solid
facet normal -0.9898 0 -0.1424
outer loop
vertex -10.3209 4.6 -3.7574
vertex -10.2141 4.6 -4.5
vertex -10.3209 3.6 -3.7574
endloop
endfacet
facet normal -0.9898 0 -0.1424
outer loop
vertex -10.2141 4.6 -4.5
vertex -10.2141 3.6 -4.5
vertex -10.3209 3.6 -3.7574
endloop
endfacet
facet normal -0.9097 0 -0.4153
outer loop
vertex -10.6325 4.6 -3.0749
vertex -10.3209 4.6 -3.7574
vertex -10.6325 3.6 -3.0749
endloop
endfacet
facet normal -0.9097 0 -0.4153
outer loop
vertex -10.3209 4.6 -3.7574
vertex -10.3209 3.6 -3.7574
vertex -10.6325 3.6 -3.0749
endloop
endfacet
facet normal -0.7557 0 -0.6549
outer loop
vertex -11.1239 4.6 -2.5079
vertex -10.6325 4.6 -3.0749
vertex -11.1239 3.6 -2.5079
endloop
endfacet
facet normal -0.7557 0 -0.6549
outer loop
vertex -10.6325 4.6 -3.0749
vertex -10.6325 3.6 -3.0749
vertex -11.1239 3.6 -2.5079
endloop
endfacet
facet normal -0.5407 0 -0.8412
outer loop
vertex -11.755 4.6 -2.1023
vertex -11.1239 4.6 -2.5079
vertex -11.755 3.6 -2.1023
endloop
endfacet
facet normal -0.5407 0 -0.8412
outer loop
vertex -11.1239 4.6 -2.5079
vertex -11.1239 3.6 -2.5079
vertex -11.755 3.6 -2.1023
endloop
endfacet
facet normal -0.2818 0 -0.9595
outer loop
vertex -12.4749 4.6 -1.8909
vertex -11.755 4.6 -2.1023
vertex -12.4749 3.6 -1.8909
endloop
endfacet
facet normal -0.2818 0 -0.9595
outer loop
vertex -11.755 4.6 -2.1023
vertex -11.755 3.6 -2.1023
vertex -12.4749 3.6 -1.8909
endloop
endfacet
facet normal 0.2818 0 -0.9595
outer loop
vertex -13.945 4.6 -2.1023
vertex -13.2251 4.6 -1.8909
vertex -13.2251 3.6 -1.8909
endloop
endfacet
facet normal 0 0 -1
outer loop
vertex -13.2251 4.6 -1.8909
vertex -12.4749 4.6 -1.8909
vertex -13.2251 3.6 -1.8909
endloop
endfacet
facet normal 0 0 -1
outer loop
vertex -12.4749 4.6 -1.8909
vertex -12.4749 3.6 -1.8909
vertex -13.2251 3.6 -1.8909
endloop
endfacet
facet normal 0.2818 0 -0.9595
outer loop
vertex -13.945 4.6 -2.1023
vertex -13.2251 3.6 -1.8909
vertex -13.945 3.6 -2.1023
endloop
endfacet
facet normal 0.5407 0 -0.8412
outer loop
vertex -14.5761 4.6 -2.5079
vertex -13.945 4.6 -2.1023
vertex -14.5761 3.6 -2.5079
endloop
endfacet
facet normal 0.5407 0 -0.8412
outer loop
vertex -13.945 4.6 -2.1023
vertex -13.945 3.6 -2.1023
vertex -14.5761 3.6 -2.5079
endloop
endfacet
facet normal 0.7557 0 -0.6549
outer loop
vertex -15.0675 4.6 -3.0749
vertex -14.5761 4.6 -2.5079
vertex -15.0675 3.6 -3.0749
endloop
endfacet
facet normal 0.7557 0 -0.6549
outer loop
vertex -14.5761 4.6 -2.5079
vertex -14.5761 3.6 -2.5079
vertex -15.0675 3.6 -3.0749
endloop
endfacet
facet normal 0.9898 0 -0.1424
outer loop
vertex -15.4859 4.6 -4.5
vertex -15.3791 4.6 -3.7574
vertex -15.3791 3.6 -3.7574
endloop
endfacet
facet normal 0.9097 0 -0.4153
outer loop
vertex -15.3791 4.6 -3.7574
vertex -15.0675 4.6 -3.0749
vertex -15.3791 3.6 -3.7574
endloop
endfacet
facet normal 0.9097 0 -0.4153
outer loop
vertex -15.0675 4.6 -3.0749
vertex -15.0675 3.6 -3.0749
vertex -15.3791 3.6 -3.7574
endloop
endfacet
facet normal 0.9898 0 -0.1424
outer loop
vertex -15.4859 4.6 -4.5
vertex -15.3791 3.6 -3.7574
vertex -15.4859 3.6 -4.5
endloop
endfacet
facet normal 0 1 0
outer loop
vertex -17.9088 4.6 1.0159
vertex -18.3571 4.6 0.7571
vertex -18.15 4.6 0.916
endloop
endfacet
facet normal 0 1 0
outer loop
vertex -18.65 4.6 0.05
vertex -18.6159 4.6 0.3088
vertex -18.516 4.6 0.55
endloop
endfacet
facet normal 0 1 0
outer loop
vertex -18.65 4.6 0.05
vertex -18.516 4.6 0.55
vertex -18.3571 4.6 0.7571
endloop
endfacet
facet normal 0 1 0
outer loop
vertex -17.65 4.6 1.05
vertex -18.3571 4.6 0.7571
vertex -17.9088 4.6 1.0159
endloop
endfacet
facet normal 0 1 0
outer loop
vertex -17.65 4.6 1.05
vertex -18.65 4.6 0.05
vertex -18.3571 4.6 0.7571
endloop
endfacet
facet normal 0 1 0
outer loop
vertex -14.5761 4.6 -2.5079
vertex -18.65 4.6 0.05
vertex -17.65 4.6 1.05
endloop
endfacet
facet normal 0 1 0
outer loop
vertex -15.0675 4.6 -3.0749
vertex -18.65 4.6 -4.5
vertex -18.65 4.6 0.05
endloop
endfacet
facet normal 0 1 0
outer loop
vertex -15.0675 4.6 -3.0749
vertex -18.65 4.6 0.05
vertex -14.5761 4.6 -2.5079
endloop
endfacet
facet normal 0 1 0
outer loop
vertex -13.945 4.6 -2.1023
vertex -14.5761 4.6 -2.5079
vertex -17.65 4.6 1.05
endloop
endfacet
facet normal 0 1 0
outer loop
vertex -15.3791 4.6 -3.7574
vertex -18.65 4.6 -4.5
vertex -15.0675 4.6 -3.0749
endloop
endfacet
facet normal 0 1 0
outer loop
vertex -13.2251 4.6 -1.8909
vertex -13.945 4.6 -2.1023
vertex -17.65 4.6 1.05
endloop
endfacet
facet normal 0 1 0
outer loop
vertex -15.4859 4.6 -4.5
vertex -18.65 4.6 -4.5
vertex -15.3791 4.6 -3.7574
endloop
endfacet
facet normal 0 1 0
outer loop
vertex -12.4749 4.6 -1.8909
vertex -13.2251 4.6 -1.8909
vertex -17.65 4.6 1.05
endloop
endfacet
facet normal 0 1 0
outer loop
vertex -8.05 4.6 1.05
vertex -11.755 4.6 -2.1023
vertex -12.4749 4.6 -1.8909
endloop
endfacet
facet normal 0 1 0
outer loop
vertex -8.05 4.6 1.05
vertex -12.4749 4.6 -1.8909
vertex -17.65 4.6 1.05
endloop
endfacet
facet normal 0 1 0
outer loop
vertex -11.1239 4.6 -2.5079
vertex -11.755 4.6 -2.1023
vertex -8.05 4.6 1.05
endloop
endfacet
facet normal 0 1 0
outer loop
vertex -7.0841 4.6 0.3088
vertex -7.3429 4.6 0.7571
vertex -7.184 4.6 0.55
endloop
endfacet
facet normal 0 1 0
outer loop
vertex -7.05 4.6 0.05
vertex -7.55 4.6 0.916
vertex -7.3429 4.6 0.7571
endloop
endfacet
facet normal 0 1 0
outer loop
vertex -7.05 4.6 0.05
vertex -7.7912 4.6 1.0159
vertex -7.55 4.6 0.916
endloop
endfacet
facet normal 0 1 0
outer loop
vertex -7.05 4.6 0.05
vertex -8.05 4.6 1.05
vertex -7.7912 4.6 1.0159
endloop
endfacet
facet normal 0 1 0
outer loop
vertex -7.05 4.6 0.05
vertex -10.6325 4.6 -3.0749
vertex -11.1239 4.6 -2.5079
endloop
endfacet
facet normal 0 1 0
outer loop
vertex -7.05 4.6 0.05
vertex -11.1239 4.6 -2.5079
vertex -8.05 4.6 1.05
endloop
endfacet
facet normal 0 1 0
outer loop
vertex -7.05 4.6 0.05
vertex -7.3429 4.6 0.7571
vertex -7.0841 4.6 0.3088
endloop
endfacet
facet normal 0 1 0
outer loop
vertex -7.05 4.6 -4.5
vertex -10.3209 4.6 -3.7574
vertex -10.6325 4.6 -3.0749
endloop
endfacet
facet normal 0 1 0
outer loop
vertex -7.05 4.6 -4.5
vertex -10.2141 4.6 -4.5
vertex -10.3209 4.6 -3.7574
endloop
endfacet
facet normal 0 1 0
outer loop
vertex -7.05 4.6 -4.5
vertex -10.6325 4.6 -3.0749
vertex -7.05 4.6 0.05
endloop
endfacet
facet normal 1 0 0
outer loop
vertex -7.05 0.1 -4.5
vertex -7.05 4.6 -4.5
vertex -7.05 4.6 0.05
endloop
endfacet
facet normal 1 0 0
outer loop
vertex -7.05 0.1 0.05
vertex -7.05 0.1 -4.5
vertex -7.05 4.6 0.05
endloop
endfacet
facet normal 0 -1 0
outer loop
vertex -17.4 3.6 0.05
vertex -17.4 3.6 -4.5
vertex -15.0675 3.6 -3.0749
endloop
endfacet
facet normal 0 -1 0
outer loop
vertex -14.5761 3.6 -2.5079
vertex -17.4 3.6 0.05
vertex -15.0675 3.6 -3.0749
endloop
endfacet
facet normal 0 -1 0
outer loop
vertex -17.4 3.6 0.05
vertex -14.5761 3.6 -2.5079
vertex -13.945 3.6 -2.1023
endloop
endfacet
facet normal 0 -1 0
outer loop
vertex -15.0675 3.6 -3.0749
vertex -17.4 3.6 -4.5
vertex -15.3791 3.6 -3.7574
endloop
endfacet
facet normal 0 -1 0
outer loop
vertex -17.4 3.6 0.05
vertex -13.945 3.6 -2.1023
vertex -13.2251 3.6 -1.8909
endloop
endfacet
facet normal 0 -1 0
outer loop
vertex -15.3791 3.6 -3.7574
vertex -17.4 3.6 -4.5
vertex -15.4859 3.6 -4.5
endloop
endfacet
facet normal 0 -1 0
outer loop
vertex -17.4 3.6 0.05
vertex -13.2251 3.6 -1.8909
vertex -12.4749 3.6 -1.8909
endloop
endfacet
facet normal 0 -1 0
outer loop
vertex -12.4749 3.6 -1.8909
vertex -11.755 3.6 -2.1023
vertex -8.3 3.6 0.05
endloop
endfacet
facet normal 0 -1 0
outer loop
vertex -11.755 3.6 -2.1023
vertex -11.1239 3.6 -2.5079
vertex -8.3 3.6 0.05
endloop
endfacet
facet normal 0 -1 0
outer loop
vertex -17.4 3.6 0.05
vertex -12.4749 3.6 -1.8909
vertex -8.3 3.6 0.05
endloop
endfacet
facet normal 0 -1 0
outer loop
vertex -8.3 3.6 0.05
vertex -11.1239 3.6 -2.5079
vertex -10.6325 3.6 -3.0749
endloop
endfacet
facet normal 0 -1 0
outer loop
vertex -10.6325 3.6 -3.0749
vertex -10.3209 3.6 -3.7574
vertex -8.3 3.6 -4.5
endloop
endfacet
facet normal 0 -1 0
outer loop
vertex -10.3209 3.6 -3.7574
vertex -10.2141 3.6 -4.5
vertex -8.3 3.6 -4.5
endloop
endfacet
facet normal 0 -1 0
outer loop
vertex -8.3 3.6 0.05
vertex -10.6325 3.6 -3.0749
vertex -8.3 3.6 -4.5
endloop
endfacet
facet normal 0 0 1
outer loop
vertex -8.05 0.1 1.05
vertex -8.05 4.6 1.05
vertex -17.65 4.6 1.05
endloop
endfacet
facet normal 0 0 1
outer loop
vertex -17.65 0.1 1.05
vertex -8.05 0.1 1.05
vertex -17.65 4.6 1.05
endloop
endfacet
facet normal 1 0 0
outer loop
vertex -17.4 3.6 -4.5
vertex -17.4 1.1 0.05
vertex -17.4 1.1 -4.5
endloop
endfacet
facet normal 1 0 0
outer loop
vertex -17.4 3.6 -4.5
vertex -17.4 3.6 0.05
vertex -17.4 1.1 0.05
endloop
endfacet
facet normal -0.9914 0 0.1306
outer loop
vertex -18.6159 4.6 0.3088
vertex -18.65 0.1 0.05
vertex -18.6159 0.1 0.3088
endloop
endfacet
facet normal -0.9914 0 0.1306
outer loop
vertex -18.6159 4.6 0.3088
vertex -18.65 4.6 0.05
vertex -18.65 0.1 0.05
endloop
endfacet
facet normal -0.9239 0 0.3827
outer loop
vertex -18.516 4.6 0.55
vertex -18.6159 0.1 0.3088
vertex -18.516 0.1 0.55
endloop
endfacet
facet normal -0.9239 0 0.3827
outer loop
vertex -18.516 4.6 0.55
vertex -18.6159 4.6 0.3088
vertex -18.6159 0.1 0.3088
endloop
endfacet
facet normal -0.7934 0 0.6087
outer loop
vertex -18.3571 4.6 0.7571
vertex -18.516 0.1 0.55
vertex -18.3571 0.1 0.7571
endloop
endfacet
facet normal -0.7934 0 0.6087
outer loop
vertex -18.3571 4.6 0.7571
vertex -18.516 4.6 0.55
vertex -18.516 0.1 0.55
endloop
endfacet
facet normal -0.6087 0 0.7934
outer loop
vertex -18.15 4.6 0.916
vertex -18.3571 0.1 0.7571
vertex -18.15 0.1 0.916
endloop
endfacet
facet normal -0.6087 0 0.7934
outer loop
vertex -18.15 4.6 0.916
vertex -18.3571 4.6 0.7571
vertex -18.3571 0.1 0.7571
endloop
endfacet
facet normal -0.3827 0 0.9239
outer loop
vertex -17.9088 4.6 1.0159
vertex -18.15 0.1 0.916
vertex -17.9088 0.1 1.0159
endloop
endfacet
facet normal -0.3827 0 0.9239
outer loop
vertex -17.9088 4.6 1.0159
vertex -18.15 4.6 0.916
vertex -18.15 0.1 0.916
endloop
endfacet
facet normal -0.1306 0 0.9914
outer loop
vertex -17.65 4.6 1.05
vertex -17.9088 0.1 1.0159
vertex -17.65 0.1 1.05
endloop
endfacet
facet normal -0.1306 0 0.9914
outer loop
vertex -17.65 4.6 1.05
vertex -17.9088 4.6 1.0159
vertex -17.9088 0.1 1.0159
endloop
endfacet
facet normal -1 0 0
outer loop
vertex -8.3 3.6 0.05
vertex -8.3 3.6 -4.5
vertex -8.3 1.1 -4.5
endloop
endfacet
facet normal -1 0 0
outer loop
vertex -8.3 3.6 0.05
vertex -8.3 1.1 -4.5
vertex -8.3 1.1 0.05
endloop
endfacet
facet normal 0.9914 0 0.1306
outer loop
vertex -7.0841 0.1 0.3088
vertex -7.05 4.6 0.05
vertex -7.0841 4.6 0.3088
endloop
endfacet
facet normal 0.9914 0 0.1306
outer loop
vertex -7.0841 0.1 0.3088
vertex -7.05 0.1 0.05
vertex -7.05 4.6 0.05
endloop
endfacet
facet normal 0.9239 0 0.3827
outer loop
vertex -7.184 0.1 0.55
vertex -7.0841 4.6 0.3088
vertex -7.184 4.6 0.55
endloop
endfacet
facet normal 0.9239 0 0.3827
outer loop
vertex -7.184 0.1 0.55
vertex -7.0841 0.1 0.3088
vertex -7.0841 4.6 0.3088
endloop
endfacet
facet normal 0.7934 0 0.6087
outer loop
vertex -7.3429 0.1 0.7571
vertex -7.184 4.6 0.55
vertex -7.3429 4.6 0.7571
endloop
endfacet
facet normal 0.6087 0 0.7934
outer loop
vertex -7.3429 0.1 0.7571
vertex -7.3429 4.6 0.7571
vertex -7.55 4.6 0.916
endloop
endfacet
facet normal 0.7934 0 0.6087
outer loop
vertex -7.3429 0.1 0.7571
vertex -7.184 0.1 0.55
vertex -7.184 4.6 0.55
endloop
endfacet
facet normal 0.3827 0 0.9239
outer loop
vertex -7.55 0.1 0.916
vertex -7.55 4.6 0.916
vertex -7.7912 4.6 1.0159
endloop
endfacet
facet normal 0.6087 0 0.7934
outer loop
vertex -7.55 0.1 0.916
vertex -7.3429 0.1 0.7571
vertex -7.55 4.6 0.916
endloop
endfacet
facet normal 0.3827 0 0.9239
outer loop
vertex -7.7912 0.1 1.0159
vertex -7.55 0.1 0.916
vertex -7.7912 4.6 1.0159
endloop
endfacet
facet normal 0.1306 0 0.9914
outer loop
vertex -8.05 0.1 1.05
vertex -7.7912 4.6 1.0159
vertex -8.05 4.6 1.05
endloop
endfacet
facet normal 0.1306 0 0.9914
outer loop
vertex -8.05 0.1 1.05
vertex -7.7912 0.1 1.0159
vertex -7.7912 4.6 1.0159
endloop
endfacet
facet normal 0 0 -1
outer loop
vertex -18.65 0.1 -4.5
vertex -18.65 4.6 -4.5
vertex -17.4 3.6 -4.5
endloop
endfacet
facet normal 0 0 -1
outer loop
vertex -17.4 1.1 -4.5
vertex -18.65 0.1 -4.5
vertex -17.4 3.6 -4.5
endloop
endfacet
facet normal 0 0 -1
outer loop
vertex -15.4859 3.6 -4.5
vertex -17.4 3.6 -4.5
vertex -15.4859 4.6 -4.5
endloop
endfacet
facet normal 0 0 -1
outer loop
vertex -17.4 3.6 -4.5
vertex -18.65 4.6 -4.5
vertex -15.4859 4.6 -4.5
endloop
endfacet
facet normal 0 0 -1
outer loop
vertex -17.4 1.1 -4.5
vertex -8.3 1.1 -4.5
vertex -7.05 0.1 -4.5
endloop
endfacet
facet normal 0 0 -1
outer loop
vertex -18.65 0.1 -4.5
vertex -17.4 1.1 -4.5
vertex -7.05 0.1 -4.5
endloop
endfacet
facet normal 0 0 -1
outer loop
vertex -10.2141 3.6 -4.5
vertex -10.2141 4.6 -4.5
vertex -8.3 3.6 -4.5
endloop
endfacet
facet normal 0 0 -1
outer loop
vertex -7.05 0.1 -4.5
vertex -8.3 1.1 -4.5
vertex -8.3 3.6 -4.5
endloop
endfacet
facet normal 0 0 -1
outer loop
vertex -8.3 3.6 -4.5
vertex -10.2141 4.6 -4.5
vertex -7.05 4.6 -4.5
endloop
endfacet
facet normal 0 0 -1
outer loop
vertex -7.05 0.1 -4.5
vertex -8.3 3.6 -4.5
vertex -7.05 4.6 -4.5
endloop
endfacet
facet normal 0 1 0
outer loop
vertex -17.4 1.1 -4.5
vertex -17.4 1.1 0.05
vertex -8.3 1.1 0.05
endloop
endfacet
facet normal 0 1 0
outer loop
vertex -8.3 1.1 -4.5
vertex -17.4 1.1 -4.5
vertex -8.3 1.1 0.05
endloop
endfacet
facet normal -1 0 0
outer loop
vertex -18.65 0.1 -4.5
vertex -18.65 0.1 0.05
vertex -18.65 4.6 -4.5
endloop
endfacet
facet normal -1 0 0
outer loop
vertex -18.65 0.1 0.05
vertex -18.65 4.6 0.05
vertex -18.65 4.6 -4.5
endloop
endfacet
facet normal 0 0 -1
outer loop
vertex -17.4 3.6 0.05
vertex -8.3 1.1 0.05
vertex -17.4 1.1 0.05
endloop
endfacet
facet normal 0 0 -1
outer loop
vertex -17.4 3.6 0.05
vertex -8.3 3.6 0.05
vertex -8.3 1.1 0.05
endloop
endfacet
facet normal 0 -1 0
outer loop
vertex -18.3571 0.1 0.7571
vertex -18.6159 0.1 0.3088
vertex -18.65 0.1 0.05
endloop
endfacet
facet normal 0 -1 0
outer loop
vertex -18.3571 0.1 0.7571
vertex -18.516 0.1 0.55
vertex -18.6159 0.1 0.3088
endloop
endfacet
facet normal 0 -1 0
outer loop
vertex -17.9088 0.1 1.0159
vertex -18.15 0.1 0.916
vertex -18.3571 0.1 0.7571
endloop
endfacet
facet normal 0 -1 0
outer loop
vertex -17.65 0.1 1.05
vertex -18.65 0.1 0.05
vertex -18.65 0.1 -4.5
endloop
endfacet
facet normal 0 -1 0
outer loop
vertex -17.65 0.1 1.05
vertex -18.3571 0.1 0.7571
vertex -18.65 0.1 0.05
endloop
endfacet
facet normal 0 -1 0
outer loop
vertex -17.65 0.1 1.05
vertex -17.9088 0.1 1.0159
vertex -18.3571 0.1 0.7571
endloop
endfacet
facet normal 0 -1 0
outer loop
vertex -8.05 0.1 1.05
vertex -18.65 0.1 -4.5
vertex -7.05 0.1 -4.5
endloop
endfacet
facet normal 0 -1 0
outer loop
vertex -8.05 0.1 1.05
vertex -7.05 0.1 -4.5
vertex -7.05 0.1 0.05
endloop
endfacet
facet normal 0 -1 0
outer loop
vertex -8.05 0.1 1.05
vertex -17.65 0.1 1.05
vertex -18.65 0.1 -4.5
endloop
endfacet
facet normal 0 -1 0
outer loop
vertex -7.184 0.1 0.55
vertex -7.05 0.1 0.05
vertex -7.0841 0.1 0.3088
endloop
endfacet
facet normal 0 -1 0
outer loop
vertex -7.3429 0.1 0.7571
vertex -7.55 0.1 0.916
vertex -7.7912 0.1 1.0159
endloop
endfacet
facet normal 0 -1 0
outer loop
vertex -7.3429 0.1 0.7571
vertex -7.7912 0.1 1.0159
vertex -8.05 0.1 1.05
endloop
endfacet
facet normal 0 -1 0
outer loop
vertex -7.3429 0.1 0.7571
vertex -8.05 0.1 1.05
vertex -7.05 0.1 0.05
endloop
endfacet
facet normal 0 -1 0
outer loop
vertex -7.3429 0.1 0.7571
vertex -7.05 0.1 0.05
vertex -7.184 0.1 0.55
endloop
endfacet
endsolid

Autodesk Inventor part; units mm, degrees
ref_plane "YZ Plane" through (0, 0, 0) normal (1, 0, 0) x (0, 1, 0)
ref_plane "XZ Plane" through (0, 0, 0) normal (0, 1, 0) x (-1, 0, 0)
ref_plane "XY Plane" through (0, 0, 0) normal (0, 0, 1) x (1, 0, 0)
ref_plane "Arbeitsebene1" through (-12.85, 3.6, -4.5) normal (0, -1, 0) x (0, 0, 1)
sketch "Skizze1" plane through (-12.85, 3.6, -4.5) normal (0, -1, 0) x (0, 0, 1)
  circle A0 centre (0, 0) radius 4.3 construction
  line L0 (0.4805, 5.7801) -> (0.4805, 4.5246)
  line L1 (0.4805, -4.5246) -> (0.4805, -5.7801)
  line L2 (0, -5.8) -> (5.55, -5.8)
  line L3 (5.55, -5.8) -> (5.55, 5.8)
  line L4 (5.55, 5.8) -> (0, 5.8)
  line L5 (0, 5.8) -> (0, -5.8)
  line L6 (0, -4.55) -> (4.55, -4.55)
  line L7 (4.55, -4.55) -> (4.55, 4.55)
  line L8 (4.55, 4.55) -> (0, 4.55)
  line L9 (0, 4.55) -> (0, -4.55)
  point P0 (4.5, -12.85)
  point P1 (0, 4.55)
  dimension "d2" = 0
  dimension "d27" = 0
  dimension "d28" = 1
extrude "Extrusion1" add sketch "Skizze1" along normal blind 2.5 contours L5 L6 L7 L8 L4 L3 L2
sketch "Skizze2" plane through (-12.85, 1.1, -4.5) normal (0, -1, 0) x (1, 0, 0)
  line L0 (-5.7801, 0.4805) -> (5.7801, 0.4805)
  line L1 (-5.8, 0) -> (-4.55, 0) projected
  line L2 (-4.55, 0) -> (-4.55, 4.55) projected
  line L3 (-4.55, 4.55) -> (4.55, 4.55) projected
  line L4 (4.55, 4.55) -> (4.55, 0) projected
  line L5 (4.55, 0) -> (5.8, 0) projected
  line L6 (5.8, 0) -> (5.8, 5.55) projected
  line L7 (5.8, 5.55) -> (-5.8, 5.55) projected
  line L8 (-5.8, 5.55) -> (-5.8, 0) projected
  line L9 (-4.55, 0) -> (4.55, 0)
  point P0 (12.85, 4.5)
extrude "Extrusion2" add sketch "Skizze2" along normal blind 1
sketch "Skizze7" plane through (-12.85, 3.6, -4.5) normal (0, 1, 0) x (1, 0, 0)
  line L0 (-5.8, 0) -> (-4.55, 0) projected
  line L1 (-5.8, -5.55) -> (-5.8, 0) projected
  line L2 (5.8, -5.55) -> (-5.8, -5.55) projected
  line L3 (5.8, 0) -> (5.8, -5.55) projected
  line L4 (4.55, 0) -> (5.8, 0) projected
  line L5 (4.55, -4.55) -> (4.55, 0) projected
  line L6 (-4.55, -4.55) -> (4.55, -4.55) projected
  line L7 (-4.55, 0) -> (-4.55, -4.55) projected
  line L8 (4.55, 0) -> (-4.55, 0)
  line L9 (-4.55, -4.55) -> (4.55, -4.55) projected
  circle A0 centre (0, 0) radius 2.6359
  point P0 (12.85, -4.5)
  point P1 (2.6359, 0)
  point P2 (-2.6359, 0)
extrude "Extrusion6" add sketch "Skizze7" along normal blind 1 contours L0 L7 L6 L5 L4 L3 L2 L1 | L8 A0 L5 L6 L7
fillet "Rundung2" radius 1 2 edges at (-18.65, 2.35, 1.05) (-7.05, 2.35, 1.05)
properties part number "20_Cube_Insert_Syringepump_Micro_syringeclamp_v3"
